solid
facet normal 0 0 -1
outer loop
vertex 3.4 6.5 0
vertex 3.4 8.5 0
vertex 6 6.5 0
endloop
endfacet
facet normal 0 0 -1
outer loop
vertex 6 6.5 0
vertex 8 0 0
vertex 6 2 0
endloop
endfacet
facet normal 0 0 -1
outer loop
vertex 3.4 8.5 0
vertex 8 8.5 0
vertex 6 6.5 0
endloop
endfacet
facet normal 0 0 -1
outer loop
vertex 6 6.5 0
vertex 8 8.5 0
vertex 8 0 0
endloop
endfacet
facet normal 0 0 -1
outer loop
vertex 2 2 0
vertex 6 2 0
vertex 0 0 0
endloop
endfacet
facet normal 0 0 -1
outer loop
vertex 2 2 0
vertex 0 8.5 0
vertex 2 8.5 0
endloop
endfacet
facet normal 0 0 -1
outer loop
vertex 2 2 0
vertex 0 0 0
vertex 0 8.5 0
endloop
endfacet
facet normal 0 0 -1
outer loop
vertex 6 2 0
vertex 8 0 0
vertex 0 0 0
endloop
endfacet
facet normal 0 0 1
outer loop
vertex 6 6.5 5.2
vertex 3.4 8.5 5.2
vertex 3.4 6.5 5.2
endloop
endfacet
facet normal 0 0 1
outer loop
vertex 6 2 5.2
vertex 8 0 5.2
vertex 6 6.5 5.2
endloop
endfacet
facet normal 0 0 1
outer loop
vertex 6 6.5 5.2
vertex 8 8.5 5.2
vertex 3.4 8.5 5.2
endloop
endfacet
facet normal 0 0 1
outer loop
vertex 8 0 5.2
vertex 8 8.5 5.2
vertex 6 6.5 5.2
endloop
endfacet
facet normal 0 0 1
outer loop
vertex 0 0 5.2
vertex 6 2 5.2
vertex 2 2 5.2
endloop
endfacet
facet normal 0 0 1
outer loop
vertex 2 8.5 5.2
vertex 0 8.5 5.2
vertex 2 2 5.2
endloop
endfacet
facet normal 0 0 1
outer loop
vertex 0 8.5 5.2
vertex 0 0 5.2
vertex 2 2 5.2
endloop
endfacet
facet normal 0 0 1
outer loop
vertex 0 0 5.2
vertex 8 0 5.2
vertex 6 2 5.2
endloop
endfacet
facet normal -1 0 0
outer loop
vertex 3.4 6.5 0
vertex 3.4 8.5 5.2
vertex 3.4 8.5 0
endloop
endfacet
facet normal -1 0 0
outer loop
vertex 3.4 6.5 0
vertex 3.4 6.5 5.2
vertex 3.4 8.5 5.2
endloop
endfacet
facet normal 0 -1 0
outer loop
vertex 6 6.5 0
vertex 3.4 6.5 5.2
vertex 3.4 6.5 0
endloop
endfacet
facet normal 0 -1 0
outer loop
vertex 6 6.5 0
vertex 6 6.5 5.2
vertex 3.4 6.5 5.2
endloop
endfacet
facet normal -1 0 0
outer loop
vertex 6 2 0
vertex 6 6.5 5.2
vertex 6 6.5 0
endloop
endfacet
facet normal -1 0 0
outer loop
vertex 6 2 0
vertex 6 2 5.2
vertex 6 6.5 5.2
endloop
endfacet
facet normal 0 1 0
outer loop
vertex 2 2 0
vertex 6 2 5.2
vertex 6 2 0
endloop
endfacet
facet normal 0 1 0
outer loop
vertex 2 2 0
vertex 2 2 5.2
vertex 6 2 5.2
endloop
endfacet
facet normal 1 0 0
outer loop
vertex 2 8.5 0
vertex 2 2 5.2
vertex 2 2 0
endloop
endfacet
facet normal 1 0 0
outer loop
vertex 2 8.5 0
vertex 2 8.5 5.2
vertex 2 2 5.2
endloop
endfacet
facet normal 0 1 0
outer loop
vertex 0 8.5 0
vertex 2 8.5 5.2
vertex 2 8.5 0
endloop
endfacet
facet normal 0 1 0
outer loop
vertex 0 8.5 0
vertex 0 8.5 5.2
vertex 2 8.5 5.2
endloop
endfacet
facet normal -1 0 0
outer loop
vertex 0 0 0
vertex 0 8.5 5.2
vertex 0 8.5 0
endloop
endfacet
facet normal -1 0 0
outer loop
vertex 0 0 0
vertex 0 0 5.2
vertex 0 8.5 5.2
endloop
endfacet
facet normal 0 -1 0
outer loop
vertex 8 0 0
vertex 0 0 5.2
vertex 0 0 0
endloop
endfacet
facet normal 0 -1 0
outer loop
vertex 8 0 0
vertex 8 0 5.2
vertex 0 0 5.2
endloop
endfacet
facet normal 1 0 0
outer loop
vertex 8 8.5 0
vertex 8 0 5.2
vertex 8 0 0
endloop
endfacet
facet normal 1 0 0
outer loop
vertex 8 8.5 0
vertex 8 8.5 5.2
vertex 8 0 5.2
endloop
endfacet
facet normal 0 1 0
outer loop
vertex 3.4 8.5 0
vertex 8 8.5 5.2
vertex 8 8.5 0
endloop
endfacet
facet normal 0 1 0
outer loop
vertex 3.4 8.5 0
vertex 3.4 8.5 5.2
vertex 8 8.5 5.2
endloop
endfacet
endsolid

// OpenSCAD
$fn = 50;

a = 2.6;
b = 2;
c = 2;
d = 4.5;
e = 2;
f = b;
g = 4;
h = 2;
i = e;
j = 6.5;
k = 5.2;

linear_extrude(height = k) union()
{
	square([h, j+i]);
	square([h+g+f, i]);
	translate([h+g,0]) square([f, e+d+c]);
	//color("red") translate([h+g-a, e+d]) polygon(points = [[0,0], [a,0], [a,c]], path = [0,1,2]);
	color("red") translate([h+g-a, e+d]) square([a, c]);
}
